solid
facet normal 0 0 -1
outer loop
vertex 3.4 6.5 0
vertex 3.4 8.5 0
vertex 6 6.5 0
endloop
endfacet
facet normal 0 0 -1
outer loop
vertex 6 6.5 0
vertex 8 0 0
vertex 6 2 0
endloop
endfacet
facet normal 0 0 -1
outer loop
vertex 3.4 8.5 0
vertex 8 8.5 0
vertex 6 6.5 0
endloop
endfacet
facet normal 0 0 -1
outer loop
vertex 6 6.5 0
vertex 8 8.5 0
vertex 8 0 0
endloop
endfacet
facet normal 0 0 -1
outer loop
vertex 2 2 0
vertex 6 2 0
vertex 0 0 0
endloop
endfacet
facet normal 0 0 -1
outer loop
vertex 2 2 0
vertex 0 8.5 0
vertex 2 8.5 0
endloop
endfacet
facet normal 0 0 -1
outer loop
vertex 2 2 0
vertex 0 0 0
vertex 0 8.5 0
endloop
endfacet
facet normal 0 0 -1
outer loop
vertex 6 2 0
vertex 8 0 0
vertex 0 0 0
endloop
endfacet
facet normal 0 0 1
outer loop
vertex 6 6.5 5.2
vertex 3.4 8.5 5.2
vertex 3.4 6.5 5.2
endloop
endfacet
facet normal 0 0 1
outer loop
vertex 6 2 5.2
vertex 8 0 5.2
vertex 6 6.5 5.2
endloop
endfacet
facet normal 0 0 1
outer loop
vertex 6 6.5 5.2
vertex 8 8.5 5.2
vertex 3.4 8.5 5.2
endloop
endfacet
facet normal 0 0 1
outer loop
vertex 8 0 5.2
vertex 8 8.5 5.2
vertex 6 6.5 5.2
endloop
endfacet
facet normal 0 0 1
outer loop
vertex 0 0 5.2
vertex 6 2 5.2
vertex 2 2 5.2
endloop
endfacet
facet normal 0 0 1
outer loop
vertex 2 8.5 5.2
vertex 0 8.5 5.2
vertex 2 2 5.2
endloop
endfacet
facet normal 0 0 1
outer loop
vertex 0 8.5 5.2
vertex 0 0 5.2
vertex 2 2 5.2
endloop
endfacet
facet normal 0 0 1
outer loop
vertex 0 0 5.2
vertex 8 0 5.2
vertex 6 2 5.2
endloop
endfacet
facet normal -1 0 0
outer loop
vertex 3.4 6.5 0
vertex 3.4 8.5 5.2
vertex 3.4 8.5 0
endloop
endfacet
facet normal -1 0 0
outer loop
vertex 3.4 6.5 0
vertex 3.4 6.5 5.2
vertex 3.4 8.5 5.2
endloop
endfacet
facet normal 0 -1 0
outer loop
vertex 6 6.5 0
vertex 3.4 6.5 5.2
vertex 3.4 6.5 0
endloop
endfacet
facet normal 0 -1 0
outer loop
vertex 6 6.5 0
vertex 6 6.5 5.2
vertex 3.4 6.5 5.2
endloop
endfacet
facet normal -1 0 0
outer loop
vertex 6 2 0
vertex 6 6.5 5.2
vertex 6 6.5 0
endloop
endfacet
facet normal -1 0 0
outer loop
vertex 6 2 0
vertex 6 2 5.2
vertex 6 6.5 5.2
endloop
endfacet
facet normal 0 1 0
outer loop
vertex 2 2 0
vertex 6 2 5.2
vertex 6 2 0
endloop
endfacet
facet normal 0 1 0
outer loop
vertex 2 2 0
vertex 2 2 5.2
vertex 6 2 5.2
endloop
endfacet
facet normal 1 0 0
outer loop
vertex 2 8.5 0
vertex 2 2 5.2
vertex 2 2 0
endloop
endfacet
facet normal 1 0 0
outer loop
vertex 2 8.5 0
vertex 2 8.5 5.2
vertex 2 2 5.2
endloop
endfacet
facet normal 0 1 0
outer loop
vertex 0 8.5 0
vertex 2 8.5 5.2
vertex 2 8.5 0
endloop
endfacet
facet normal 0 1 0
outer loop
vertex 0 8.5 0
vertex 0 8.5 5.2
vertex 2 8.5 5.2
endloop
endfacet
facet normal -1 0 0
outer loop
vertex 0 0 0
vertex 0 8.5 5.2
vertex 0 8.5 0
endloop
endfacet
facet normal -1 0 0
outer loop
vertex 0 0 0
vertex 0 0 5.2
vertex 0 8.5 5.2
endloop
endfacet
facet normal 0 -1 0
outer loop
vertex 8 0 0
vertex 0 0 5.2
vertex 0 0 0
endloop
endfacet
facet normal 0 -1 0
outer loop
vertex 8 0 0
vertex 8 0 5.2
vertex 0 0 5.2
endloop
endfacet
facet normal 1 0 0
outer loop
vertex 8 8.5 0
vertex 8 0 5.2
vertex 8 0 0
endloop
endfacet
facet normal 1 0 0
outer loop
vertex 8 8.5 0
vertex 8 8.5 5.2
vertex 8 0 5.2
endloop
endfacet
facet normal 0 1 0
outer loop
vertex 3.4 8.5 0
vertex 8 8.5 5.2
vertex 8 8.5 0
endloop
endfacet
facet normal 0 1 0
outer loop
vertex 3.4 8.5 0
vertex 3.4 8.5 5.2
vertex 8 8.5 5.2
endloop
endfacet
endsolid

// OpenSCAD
$fn = 50;

a = 2.6;
b = 2;
c = 2;
d = 4.5;
e = 2;
f = b;
g = 4;
h = 2;
i = e;
j = 6.5;
k = 5.2;

linear_extrude(height = k) union()
{
	square([h, j+i]);
	square([h+g+f, i]);
	translate([h+g,0]) square([f, e+d+c]);
	//color("red") translate([h+g-a, e+d]) polygon(points = [[0,0], [a,0], [a,c]], path = [0,1,2]);
	color("red") translate([h+g-a, e+d]) square([a, c]);
}
